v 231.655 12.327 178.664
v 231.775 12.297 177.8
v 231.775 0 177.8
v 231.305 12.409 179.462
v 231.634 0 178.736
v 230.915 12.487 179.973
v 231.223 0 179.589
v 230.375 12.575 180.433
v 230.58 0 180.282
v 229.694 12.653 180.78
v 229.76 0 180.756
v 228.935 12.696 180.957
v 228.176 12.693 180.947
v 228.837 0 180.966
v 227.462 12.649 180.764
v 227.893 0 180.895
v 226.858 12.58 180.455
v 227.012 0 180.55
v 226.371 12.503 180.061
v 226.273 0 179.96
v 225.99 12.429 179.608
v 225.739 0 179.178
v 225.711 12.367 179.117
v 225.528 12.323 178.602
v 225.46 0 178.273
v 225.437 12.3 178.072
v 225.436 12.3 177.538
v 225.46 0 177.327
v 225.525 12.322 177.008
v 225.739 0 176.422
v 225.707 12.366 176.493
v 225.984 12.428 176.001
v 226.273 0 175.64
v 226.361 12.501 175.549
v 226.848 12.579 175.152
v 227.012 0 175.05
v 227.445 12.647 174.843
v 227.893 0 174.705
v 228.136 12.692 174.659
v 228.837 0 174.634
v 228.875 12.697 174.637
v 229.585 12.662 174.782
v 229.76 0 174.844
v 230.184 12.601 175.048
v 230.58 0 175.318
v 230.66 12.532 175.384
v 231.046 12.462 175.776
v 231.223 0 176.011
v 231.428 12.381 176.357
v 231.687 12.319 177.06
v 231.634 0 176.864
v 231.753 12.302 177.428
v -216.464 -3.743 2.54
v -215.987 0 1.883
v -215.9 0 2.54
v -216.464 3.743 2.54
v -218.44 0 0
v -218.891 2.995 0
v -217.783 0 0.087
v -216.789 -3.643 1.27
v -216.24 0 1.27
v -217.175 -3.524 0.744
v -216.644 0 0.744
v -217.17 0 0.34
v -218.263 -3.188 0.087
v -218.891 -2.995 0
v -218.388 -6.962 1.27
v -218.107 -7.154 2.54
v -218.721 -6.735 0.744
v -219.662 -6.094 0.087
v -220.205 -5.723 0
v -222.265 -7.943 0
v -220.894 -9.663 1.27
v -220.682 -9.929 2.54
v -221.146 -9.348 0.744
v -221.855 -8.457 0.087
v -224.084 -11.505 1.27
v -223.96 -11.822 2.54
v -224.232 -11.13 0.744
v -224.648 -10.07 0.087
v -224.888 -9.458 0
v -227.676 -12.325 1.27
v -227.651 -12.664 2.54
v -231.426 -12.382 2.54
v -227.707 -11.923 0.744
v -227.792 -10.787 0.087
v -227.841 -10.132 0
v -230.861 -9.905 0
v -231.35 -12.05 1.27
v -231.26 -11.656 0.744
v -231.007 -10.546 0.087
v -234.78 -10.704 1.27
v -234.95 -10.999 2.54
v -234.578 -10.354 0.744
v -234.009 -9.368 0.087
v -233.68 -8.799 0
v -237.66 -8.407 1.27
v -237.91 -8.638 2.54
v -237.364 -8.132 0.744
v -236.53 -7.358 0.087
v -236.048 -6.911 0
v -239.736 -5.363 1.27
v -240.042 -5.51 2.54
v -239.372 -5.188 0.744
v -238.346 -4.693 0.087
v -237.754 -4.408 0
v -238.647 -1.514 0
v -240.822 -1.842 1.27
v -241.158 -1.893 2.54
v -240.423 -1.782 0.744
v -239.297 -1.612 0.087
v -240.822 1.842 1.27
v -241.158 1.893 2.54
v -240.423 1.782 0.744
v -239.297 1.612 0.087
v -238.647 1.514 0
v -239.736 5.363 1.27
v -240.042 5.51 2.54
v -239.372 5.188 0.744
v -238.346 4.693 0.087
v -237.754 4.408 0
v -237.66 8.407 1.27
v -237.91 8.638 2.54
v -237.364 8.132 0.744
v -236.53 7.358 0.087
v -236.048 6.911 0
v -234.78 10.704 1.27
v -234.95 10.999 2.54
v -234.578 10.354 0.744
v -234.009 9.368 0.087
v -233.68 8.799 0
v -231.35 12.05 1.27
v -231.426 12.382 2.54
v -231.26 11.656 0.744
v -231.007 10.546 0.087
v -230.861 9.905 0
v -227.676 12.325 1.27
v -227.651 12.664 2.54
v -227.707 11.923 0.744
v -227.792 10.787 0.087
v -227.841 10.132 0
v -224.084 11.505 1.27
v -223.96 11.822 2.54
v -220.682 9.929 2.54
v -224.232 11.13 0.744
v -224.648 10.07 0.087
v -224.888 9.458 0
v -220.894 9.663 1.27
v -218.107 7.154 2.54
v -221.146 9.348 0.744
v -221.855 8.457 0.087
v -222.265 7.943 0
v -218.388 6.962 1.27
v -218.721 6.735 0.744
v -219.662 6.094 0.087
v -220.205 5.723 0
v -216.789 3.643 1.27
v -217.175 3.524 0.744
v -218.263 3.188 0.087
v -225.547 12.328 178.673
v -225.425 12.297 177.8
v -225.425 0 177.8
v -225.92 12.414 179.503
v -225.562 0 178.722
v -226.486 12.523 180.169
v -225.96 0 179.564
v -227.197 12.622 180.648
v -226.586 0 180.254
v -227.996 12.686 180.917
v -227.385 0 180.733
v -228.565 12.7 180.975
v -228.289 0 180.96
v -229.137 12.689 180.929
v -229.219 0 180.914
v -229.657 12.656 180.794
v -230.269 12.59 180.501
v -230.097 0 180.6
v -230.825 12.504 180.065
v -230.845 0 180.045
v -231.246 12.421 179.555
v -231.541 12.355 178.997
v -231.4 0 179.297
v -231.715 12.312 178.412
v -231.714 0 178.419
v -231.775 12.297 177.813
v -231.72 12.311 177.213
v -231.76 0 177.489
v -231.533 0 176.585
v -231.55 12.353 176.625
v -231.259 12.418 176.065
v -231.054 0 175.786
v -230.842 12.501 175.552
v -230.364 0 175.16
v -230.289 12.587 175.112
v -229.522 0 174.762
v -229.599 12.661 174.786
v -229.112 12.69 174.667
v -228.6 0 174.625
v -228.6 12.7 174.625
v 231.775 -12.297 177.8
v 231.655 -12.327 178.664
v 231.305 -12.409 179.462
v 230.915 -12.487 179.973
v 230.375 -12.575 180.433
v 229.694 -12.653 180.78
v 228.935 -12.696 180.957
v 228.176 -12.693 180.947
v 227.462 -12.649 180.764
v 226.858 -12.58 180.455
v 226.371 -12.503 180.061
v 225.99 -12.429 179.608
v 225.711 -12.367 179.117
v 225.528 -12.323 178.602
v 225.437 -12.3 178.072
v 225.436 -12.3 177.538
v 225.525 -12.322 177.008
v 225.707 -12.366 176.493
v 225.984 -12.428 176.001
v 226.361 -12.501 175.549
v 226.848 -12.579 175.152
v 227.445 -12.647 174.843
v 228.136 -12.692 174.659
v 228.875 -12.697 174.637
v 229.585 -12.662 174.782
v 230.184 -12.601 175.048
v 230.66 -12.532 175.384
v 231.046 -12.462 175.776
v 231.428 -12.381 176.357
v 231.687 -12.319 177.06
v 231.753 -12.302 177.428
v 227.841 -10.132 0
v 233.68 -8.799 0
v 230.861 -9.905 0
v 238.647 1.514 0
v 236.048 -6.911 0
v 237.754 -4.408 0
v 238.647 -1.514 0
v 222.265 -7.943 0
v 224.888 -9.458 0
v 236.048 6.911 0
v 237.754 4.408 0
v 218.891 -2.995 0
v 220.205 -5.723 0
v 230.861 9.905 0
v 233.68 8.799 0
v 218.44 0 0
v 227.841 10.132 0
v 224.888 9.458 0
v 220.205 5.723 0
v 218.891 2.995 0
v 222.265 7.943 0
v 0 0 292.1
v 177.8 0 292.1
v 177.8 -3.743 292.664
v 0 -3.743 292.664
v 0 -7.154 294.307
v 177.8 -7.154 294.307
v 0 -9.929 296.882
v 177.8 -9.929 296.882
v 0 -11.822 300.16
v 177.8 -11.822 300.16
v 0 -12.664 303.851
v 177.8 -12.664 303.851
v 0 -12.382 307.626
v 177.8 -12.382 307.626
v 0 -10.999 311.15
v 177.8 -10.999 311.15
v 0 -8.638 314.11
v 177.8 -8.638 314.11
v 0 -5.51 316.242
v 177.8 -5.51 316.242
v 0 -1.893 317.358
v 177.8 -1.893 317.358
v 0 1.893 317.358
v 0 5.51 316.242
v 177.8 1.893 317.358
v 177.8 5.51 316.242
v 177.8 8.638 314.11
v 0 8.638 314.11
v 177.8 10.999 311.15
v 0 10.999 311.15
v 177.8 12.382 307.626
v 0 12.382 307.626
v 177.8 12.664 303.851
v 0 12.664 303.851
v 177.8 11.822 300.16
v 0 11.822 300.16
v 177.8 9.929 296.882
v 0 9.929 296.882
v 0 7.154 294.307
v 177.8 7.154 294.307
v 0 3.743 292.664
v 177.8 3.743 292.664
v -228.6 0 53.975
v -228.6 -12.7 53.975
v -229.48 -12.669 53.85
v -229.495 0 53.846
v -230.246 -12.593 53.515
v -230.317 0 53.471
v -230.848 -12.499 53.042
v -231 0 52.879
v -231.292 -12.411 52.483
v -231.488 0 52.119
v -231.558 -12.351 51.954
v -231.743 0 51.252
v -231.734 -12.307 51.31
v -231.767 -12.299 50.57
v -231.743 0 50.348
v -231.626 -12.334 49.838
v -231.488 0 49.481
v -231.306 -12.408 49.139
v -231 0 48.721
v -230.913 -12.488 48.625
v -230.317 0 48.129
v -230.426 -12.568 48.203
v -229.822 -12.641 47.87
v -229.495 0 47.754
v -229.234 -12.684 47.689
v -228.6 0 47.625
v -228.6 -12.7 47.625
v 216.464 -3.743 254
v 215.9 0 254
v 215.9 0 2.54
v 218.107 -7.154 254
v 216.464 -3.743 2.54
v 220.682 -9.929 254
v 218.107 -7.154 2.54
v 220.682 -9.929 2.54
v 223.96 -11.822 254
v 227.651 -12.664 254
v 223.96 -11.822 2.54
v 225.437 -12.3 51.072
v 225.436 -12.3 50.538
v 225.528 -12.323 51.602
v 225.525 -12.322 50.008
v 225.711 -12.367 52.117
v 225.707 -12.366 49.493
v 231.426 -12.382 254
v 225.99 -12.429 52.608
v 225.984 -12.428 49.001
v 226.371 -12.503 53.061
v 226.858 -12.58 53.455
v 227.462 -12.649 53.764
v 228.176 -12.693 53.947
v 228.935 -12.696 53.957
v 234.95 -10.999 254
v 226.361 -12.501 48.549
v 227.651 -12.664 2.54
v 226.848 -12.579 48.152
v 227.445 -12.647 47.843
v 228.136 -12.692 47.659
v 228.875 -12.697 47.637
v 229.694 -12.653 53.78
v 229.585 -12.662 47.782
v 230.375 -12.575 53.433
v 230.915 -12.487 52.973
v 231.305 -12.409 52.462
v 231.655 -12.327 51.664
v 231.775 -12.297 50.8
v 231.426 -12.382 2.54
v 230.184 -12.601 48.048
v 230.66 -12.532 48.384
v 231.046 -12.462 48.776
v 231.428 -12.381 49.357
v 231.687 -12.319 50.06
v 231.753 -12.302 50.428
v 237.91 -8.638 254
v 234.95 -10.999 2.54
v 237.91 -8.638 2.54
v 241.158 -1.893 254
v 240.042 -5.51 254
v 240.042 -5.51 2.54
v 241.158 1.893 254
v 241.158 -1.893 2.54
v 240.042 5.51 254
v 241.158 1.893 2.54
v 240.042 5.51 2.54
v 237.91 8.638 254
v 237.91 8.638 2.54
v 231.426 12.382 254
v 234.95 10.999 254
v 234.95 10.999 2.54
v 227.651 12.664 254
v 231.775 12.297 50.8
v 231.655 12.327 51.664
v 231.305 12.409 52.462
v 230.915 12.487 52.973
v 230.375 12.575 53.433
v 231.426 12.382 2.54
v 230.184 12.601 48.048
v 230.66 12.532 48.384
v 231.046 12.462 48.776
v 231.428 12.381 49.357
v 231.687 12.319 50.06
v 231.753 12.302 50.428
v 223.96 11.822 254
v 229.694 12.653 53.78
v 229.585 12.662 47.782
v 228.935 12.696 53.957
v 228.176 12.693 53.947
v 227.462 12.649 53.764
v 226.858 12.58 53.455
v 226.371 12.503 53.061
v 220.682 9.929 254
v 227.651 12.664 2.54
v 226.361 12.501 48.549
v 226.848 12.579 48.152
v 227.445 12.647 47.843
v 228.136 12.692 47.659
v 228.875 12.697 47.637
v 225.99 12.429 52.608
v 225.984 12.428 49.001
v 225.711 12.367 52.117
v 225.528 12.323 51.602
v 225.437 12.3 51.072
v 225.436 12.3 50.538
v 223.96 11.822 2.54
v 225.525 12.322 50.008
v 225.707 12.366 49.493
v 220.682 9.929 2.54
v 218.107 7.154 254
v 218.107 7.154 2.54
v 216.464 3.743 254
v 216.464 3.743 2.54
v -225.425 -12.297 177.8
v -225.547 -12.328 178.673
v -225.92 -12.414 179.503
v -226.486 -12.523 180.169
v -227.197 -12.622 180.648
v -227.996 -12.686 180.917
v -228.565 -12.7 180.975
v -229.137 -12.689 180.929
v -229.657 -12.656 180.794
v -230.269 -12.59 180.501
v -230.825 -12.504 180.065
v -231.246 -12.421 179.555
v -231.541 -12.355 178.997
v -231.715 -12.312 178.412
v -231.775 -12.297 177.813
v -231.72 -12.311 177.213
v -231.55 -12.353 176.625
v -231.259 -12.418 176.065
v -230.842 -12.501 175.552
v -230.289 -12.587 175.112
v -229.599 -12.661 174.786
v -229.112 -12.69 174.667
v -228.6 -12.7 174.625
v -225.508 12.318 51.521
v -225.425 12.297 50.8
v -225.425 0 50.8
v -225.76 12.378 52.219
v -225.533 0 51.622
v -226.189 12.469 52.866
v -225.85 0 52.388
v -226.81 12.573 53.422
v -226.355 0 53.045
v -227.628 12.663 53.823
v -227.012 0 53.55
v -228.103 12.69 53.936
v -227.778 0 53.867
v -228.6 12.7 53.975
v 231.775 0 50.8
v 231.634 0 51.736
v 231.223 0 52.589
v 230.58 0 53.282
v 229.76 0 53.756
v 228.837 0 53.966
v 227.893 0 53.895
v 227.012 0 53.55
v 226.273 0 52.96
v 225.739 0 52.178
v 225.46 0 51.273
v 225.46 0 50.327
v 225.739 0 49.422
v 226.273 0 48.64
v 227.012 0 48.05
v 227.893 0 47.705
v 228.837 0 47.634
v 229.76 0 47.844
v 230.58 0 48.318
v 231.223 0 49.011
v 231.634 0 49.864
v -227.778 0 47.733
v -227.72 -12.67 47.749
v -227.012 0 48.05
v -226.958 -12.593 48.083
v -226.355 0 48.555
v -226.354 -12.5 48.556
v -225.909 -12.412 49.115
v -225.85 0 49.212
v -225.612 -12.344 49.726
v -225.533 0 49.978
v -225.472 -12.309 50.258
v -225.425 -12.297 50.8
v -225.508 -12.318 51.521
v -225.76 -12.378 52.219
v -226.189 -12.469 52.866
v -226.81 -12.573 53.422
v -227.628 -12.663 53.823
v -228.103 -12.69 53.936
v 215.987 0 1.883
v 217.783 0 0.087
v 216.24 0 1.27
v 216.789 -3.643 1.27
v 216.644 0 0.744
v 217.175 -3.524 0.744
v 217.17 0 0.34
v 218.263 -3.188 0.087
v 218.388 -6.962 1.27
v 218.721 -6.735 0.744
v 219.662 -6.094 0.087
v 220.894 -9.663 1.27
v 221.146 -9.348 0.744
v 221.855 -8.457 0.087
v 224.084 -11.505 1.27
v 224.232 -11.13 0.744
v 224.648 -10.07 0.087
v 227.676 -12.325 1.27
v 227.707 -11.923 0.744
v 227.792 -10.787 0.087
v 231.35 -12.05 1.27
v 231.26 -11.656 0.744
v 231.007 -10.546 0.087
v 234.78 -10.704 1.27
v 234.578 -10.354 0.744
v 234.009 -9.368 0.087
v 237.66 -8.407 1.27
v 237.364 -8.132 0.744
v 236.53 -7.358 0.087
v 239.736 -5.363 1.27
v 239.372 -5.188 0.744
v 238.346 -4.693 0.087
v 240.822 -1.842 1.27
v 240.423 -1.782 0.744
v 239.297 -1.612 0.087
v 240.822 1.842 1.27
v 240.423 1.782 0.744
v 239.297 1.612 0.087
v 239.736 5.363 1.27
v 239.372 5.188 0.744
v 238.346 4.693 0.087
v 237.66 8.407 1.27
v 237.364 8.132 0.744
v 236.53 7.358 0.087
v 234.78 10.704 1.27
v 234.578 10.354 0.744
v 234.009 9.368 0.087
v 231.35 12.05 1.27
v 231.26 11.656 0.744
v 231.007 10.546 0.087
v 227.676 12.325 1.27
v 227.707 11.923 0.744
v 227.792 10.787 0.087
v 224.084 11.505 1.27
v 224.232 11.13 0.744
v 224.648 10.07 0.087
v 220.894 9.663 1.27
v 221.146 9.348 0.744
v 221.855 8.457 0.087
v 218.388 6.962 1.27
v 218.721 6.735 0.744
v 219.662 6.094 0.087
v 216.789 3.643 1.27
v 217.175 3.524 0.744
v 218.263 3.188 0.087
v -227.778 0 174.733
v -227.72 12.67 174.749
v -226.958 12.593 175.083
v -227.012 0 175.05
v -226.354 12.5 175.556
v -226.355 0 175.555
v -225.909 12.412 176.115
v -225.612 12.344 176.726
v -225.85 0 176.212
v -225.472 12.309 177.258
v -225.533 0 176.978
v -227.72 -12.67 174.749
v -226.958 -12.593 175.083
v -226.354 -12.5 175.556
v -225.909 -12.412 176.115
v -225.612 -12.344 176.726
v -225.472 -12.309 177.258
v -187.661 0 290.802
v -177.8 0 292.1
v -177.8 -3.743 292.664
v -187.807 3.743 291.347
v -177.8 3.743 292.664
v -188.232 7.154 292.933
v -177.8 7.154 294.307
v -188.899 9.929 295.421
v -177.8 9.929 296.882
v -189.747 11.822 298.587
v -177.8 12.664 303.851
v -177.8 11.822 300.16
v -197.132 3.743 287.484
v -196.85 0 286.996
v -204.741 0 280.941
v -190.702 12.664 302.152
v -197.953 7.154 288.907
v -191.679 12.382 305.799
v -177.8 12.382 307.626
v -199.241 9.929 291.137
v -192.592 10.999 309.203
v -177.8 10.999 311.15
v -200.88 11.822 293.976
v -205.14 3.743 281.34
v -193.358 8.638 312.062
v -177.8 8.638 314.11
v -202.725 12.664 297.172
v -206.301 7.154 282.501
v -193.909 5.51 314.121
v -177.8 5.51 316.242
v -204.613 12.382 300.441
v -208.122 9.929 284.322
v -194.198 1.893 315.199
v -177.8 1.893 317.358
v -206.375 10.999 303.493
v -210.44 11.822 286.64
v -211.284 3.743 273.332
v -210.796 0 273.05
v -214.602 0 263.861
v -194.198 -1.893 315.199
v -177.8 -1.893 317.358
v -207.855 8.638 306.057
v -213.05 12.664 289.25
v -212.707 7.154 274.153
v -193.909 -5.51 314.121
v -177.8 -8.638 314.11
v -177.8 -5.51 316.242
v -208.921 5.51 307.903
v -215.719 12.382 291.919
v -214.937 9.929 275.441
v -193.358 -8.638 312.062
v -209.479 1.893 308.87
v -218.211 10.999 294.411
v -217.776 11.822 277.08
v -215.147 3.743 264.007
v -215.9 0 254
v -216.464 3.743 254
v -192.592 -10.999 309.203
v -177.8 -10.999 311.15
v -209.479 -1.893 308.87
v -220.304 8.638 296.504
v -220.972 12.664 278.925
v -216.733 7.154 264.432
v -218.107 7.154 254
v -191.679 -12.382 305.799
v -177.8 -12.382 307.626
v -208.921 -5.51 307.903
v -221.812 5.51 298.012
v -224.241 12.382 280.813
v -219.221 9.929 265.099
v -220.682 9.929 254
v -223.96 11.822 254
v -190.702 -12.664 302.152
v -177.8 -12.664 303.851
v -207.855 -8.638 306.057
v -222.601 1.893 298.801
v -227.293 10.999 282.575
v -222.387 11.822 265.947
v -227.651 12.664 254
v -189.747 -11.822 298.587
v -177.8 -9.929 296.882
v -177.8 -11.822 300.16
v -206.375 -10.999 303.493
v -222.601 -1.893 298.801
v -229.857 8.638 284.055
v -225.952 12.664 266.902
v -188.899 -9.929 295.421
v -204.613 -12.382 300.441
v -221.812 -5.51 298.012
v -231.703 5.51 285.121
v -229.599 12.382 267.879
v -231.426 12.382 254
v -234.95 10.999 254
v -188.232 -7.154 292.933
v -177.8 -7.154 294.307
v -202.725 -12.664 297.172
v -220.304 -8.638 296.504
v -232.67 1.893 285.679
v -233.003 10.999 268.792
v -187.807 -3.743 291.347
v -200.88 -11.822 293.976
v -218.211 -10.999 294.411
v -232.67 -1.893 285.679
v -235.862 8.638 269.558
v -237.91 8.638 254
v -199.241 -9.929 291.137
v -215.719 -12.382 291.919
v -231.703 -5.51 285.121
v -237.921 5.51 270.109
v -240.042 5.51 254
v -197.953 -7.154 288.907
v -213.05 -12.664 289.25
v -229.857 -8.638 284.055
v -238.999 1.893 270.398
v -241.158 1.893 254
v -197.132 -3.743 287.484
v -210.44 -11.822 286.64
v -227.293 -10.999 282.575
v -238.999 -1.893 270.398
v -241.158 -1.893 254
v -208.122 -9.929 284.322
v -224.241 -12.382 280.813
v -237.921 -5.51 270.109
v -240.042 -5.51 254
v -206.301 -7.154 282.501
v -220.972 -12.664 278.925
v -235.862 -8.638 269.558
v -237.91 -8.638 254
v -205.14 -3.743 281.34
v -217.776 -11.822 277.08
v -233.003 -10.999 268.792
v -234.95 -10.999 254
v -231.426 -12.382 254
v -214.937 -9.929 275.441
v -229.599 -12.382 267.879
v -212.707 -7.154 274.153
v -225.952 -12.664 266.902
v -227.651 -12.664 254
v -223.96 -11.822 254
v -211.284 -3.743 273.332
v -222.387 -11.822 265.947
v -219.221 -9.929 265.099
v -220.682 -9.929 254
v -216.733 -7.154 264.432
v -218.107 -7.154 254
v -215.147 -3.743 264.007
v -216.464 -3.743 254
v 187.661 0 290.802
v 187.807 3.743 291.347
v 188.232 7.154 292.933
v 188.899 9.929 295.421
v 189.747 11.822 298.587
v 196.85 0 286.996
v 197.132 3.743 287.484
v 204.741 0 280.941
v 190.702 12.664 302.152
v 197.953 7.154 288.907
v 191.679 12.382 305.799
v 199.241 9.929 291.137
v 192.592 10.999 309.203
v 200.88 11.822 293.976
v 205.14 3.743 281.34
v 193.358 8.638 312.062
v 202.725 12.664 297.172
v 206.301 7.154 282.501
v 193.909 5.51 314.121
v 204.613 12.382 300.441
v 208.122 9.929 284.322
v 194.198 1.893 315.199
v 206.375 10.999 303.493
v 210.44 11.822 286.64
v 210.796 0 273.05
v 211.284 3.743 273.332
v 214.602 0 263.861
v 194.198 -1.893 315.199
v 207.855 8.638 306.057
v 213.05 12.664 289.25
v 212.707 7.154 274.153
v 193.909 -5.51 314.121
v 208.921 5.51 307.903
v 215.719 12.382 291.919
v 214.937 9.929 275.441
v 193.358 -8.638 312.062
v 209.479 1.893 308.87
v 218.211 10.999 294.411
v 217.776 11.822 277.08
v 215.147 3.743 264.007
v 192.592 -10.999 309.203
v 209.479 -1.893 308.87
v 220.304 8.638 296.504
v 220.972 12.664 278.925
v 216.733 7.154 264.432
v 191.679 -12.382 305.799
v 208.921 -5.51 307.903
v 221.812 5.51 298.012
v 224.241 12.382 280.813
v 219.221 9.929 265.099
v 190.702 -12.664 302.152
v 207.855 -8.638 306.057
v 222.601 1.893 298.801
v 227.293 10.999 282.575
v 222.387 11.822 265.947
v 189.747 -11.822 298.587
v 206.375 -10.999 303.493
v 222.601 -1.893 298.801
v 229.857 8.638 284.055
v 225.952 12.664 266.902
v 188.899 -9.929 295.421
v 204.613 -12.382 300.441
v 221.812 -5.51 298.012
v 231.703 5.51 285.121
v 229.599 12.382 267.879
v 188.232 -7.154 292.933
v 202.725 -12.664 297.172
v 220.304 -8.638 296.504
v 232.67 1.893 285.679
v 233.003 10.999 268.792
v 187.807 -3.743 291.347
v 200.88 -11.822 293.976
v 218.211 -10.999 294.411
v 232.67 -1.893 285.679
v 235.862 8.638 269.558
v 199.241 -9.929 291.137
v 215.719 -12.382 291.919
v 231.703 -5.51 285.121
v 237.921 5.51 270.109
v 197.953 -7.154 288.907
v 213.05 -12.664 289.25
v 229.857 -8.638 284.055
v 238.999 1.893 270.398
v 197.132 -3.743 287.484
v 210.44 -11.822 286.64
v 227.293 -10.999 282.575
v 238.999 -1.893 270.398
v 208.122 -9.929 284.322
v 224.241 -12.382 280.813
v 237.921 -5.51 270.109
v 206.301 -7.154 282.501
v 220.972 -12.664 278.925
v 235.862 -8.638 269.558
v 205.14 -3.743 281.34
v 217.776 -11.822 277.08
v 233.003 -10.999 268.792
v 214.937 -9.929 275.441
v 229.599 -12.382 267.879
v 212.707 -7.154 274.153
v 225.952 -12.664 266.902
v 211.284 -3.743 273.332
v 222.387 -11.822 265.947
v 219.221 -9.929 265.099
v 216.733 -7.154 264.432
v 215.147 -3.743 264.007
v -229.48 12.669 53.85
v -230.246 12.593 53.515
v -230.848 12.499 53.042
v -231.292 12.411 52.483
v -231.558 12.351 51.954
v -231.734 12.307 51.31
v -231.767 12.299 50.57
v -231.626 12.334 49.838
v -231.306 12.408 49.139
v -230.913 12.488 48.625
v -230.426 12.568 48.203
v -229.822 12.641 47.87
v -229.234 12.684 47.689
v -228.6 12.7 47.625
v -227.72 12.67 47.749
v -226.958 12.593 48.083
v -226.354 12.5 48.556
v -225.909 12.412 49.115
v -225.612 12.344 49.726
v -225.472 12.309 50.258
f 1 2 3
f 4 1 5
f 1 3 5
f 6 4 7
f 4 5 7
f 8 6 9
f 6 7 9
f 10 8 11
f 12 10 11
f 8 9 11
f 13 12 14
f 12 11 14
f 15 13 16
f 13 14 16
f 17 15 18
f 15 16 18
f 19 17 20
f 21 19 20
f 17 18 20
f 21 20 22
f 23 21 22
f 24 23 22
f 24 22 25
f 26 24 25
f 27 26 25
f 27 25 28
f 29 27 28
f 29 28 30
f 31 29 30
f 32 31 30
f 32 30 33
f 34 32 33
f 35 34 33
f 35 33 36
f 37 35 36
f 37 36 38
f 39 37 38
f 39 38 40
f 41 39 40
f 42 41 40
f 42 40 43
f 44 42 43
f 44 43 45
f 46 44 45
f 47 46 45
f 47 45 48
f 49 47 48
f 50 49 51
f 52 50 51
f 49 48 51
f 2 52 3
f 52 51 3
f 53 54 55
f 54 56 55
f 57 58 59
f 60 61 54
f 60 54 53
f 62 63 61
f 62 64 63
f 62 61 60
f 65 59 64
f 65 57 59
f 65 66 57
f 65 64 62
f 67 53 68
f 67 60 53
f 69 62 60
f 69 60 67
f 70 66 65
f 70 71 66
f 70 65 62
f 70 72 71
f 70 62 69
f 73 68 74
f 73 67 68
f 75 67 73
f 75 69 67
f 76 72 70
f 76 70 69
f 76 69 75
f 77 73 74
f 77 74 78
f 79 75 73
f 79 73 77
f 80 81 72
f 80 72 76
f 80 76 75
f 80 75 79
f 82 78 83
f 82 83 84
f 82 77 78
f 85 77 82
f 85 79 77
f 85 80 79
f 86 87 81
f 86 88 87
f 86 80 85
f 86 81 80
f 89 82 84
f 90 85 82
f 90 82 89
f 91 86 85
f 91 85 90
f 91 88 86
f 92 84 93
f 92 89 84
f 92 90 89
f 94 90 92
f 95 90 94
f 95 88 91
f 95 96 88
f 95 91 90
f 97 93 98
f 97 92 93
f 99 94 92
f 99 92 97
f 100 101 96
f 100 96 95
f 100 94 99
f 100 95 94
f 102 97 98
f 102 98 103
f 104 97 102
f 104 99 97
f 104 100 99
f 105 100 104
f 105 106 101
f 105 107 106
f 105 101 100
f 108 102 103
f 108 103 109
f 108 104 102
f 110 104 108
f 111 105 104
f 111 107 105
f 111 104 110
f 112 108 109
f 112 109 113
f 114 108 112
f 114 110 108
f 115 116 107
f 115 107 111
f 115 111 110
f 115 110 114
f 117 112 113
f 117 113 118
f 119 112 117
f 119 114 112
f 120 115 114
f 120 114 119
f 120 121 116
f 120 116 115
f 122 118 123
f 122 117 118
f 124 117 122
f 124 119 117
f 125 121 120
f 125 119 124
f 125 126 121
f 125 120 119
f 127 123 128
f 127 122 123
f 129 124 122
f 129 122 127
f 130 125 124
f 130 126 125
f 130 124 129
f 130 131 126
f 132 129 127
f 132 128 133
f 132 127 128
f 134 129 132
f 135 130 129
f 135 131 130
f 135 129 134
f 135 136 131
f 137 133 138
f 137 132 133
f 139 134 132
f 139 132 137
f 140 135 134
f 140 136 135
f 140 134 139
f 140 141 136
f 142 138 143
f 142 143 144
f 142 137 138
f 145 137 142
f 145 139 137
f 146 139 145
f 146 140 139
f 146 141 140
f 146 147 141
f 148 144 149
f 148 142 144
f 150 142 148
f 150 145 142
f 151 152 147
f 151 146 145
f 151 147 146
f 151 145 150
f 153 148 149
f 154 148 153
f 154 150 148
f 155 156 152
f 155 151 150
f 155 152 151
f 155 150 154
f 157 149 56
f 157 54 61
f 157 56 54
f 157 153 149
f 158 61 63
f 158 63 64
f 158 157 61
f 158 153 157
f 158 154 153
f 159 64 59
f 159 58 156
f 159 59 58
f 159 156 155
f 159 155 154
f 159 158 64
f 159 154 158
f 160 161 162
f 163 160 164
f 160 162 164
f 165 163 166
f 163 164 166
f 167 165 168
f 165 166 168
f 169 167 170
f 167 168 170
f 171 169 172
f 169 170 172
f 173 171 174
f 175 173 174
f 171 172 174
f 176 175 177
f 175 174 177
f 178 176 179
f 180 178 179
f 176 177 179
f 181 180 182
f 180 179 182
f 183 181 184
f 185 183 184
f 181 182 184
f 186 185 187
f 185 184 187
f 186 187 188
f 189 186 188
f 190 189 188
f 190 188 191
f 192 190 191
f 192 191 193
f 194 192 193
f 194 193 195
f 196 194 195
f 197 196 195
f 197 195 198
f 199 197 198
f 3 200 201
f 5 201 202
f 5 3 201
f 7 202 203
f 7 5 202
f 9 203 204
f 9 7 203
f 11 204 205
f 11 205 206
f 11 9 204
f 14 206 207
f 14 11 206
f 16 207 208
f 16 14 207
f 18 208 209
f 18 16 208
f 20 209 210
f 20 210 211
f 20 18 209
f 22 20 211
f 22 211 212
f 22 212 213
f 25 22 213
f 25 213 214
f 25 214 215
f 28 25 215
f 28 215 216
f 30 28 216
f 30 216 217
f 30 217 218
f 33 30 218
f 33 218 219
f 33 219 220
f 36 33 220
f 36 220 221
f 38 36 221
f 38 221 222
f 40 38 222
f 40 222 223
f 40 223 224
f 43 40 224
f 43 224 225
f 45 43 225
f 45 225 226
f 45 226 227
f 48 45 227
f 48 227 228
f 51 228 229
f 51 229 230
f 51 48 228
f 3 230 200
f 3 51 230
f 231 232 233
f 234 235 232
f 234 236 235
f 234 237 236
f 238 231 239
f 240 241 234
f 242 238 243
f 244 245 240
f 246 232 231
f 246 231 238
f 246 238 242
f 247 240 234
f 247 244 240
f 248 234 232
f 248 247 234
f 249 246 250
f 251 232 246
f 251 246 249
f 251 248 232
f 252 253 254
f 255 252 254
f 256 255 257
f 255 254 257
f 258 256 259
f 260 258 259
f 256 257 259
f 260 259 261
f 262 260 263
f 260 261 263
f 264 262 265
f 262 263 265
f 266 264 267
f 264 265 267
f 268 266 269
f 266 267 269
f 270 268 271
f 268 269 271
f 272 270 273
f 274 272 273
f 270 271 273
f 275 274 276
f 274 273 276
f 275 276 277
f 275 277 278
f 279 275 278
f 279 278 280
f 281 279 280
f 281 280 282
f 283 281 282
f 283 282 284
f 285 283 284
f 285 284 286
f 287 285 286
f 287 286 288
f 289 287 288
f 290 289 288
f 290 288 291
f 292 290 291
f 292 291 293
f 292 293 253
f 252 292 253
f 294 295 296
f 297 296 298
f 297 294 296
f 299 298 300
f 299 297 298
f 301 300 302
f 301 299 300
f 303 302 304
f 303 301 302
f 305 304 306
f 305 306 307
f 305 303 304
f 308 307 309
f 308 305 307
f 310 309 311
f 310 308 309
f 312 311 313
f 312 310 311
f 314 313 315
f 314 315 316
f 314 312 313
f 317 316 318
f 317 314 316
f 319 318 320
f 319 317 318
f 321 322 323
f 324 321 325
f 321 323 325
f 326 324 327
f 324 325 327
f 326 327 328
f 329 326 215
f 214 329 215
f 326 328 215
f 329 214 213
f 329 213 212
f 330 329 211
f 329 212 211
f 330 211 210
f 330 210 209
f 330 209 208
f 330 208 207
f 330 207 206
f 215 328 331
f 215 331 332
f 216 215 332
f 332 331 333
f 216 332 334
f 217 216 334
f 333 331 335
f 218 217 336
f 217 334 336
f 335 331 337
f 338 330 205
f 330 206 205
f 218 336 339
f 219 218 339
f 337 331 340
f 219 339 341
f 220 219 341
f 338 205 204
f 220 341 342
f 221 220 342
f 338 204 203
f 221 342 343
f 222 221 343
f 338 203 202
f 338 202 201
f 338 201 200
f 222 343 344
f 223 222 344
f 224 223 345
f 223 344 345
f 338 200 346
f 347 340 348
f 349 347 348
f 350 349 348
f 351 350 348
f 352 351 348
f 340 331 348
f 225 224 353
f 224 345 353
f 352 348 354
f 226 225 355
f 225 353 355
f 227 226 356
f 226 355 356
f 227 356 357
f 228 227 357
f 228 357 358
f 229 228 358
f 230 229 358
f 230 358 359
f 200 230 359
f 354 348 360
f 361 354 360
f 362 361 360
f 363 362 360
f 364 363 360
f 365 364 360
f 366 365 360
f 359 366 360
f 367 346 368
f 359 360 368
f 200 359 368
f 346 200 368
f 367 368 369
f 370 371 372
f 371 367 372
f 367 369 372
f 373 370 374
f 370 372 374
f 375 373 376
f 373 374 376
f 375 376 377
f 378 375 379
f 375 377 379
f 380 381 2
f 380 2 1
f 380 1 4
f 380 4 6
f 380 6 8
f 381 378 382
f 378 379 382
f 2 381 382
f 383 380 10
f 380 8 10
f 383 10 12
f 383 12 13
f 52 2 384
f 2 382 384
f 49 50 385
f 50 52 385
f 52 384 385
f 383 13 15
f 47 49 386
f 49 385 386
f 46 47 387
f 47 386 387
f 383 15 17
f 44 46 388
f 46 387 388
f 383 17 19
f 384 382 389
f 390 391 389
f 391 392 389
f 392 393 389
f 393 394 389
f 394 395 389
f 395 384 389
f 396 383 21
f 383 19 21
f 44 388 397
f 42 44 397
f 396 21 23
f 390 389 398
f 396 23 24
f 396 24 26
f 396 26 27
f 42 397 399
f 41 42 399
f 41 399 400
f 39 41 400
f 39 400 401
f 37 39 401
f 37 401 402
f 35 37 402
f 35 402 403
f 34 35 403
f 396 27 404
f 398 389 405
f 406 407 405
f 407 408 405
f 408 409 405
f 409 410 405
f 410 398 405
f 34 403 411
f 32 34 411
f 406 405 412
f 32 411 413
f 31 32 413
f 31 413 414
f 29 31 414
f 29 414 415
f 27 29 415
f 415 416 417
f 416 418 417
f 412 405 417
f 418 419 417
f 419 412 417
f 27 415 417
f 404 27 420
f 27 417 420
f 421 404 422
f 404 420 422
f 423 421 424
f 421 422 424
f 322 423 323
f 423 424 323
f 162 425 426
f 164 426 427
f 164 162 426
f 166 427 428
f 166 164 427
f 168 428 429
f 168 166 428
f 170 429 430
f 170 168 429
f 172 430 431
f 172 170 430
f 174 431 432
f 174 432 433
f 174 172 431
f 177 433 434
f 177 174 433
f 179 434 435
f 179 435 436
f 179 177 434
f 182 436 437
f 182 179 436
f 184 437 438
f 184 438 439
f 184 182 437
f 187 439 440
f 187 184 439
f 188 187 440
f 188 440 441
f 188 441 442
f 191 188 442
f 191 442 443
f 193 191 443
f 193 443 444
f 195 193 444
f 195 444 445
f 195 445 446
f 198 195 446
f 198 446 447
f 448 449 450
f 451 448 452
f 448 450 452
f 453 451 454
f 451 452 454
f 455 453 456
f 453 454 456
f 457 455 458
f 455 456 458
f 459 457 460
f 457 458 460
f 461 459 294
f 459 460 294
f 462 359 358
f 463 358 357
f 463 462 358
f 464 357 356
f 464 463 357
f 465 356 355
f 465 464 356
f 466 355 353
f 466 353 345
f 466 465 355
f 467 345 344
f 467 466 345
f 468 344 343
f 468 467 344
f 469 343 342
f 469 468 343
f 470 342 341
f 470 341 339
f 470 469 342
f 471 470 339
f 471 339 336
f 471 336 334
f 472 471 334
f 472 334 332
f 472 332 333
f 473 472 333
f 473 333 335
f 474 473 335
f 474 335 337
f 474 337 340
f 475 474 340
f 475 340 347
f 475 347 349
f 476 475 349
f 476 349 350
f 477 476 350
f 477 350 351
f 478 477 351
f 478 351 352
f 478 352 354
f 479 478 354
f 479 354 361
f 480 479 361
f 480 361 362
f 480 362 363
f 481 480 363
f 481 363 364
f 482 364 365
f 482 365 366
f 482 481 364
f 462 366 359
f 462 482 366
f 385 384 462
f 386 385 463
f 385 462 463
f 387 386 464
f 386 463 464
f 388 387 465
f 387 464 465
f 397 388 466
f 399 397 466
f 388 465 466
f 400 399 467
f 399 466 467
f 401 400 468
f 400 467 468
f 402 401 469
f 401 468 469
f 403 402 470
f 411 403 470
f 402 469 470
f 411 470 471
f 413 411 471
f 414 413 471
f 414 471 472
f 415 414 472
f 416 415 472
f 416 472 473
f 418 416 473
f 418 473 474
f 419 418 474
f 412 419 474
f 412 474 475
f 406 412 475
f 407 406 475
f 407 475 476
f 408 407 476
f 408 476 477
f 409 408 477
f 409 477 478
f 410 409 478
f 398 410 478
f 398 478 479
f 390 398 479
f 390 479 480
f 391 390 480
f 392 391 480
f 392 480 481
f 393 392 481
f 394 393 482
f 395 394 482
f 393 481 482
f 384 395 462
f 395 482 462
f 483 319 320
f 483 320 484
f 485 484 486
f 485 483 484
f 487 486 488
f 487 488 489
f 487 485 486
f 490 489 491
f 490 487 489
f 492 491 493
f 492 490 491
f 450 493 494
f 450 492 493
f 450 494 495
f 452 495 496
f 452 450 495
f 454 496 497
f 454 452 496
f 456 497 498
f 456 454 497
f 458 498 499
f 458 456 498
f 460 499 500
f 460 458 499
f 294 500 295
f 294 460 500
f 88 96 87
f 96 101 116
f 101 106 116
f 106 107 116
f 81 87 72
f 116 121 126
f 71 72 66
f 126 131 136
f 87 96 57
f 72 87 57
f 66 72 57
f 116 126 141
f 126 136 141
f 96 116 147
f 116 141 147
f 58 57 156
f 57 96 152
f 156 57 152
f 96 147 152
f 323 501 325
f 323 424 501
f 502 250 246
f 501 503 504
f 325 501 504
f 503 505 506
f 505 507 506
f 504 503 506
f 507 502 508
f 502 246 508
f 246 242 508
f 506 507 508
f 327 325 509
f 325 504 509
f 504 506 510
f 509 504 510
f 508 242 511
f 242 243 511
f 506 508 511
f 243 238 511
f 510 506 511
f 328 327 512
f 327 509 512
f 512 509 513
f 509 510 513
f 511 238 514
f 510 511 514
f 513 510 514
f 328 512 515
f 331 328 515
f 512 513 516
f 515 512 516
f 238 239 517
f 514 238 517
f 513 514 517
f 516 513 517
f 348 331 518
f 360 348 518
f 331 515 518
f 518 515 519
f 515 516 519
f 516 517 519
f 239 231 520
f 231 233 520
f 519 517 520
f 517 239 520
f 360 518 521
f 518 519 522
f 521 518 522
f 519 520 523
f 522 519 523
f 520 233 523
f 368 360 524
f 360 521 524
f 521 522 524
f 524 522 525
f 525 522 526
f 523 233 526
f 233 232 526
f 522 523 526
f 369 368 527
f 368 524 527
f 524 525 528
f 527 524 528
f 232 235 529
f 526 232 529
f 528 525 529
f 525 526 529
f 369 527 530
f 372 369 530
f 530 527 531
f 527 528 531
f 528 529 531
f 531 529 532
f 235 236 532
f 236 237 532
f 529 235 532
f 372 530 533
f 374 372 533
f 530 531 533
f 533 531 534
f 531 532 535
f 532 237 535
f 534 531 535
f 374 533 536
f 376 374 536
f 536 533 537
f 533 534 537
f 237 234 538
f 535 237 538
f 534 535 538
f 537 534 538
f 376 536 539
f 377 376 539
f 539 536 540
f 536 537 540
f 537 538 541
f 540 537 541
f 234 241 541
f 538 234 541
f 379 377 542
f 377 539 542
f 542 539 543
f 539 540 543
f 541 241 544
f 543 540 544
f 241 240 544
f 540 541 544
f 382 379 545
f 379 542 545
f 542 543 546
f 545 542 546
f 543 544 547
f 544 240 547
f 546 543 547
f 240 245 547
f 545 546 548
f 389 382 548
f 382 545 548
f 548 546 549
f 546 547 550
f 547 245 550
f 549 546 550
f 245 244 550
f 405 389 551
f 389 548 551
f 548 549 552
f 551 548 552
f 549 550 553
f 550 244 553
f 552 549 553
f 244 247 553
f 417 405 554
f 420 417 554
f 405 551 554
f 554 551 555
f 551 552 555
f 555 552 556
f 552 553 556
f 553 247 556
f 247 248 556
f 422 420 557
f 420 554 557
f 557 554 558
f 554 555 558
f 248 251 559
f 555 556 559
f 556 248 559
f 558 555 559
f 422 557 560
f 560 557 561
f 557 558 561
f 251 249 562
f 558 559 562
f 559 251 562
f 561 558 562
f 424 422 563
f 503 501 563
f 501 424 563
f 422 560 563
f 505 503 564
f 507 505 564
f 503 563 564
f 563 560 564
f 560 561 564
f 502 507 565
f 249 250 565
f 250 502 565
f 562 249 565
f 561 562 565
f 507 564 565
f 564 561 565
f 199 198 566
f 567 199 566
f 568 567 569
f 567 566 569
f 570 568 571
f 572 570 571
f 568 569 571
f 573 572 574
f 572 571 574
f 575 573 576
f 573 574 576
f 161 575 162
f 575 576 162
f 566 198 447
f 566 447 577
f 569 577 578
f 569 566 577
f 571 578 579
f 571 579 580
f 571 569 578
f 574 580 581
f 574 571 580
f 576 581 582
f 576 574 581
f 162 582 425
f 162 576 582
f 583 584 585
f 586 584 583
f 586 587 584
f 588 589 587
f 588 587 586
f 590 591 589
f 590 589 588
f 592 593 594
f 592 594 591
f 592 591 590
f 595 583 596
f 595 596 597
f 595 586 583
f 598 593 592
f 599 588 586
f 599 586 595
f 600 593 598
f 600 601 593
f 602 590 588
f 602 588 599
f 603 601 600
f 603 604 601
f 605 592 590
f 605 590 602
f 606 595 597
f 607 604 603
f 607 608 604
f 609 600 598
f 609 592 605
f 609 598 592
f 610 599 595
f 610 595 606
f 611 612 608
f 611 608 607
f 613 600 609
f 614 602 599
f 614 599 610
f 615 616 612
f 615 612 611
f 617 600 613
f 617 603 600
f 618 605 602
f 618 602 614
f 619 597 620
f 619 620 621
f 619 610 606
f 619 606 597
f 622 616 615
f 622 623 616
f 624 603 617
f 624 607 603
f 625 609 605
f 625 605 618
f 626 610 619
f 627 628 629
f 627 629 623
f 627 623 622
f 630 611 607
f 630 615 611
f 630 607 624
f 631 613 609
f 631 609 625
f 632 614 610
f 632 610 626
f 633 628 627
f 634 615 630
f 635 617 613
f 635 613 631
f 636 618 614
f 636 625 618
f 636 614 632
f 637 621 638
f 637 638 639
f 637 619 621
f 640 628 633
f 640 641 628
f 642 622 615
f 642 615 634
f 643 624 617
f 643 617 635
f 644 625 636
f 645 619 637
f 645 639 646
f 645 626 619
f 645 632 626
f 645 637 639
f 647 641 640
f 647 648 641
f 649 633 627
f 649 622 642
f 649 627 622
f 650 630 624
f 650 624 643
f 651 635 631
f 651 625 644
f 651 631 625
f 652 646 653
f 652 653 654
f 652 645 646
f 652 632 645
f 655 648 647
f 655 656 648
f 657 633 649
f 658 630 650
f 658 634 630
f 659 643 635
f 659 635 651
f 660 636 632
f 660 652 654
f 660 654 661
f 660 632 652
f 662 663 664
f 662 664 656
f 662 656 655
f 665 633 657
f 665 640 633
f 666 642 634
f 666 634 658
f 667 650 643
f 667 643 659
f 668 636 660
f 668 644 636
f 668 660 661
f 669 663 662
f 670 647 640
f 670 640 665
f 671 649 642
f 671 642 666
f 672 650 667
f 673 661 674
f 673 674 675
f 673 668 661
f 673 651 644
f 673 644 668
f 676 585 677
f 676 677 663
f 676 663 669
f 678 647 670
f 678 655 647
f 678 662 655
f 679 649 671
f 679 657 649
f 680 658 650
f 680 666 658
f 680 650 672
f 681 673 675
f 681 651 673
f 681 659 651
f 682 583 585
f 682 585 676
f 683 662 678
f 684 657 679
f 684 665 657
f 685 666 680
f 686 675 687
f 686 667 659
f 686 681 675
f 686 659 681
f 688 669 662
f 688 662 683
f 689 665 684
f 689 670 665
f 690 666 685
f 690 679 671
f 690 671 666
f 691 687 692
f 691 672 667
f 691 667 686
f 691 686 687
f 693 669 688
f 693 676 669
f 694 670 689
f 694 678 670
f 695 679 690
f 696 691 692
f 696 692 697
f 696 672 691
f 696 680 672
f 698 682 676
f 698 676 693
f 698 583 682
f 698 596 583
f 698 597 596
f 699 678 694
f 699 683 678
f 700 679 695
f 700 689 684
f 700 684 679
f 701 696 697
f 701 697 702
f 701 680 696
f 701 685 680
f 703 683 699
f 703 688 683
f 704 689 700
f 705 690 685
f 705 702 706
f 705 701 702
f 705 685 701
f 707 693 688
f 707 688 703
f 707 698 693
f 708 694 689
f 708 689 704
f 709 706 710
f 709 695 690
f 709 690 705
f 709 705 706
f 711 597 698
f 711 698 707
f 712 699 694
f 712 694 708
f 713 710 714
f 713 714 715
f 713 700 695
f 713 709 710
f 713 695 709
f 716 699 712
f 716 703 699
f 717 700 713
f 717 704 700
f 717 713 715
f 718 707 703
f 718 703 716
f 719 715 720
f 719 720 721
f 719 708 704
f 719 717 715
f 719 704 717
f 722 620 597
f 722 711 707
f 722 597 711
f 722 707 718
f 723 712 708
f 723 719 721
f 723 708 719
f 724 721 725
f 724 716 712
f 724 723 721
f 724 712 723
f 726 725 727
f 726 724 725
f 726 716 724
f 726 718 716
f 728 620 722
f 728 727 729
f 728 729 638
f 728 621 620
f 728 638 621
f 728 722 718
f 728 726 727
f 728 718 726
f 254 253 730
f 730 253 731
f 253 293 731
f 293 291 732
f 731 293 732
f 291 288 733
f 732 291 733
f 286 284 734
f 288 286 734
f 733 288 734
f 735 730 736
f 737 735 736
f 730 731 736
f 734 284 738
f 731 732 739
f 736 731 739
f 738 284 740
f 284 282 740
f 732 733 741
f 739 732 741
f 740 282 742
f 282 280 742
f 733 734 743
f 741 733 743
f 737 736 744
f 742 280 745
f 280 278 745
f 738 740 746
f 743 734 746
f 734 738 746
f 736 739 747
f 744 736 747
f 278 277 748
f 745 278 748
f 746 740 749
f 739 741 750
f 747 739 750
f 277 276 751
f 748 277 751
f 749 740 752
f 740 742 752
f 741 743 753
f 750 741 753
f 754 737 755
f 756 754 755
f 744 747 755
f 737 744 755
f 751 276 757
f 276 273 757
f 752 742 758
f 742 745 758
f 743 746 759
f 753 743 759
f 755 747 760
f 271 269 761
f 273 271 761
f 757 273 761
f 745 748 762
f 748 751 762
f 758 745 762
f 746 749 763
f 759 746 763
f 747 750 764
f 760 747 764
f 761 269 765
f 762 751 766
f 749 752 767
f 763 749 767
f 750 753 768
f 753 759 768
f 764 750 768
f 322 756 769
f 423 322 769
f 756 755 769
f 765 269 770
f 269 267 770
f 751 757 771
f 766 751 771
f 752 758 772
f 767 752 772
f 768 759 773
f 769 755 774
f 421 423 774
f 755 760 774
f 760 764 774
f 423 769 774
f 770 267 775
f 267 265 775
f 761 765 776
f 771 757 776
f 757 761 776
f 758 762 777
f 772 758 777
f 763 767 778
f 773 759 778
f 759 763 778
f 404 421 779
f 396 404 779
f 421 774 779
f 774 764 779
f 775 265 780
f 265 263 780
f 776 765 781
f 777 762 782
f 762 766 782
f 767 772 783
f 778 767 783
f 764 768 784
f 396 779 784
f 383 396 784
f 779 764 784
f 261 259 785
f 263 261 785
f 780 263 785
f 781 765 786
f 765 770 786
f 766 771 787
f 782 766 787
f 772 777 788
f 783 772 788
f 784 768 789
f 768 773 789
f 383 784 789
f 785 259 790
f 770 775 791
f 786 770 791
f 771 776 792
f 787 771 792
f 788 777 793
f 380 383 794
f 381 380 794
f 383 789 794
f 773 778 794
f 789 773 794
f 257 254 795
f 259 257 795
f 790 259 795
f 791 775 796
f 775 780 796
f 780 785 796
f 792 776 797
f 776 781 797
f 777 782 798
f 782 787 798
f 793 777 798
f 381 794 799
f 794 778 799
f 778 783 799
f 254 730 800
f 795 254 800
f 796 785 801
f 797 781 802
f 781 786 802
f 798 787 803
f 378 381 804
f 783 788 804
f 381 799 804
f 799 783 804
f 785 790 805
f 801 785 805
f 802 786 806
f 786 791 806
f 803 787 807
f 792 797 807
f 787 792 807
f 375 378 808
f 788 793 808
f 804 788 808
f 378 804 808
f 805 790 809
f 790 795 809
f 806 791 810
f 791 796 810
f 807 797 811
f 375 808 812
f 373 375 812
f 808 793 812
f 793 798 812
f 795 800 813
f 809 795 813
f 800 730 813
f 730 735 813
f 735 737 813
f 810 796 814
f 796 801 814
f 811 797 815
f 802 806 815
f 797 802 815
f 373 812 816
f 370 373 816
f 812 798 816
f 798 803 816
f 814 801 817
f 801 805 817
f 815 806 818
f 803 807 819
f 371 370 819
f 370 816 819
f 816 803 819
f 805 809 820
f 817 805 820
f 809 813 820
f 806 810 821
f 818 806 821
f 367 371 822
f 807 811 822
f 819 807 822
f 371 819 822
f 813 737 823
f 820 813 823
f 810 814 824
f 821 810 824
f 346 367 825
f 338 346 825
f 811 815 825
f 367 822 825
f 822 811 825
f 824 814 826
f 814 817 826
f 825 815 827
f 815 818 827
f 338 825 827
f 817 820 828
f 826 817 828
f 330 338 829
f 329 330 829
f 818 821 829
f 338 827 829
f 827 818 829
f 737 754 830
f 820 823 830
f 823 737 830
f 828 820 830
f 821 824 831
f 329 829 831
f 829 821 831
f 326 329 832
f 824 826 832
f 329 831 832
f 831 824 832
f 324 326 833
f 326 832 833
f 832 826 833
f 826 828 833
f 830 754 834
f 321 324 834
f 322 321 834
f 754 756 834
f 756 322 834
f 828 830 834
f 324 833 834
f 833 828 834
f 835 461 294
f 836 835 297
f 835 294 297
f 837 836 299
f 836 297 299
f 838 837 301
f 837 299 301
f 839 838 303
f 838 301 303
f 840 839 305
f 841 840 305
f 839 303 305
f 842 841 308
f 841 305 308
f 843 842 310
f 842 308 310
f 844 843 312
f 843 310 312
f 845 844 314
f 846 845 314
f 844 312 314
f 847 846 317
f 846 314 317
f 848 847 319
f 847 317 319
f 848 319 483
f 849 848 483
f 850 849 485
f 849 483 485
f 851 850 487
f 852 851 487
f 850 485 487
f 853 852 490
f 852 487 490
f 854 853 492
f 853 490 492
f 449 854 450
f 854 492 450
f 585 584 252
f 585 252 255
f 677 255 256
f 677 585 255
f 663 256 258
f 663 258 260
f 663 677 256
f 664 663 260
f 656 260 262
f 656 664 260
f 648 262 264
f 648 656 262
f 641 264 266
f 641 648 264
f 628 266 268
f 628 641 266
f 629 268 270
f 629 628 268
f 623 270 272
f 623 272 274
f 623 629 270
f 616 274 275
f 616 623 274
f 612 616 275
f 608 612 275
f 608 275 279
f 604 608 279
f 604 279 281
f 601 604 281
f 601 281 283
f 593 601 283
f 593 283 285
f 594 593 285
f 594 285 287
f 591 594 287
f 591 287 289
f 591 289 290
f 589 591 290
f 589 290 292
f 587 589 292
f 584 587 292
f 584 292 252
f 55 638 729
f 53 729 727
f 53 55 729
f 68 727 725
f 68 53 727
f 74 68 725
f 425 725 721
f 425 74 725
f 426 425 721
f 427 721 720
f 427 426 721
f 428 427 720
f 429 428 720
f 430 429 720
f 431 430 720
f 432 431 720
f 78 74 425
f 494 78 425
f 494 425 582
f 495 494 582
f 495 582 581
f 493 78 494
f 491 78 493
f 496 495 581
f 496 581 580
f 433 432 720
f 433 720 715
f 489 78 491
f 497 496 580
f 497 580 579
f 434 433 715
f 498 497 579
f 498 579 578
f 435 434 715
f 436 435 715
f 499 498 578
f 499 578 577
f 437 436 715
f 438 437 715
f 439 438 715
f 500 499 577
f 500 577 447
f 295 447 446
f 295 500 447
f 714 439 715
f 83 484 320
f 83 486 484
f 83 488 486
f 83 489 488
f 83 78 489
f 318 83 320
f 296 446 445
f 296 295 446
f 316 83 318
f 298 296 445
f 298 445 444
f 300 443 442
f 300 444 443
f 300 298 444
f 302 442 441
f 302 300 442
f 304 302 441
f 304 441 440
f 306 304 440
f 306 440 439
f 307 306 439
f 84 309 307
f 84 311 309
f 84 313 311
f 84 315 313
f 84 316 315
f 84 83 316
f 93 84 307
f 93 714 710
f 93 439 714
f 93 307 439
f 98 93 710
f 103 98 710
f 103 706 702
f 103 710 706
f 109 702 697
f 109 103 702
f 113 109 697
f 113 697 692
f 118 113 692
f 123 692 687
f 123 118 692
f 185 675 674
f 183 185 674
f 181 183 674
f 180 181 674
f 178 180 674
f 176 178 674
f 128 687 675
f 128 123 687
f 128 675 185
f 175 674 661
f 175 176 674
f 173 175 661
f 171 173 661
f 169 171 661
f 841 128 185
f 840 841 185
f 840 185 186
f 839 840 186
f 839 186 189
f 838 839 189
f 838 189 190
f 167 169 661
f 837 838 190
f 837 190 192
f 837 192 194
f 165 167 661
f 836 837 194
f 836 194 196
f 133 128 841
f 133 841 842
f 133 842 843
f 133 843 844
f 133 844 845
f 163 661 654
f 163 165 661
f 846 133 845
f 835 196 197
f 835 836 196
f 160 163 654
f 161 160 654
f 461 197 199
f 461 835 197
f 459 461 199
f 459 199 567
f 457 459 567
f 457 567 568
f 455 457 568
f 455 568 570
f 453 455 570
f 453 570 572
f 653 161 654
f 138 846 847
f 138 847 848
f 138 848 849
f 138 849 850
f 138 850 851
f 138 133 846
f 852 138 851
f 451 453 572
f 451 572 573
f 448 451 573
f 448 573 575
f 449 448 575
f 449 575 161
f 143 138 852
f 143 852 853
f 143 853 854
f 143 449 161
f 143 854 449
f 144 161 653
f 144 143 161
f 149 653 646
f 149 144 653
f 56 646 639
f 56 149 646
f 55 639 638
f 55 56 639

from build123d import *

# Parameters (mm, degrees)
F0_R          = 12.7
F4_R          = 3.175
F5_DEPTH      = 25.4
F5_DEPTH_BACK = 25.4
F6_R          = 2.54


with BuildPart() as f2:
    # F2: sweep along a path in F1
    with BuildLine(Plane.XZ) as f2_path:
        Line((0, 304.8), (-177.8, 304.8))
        ThreePointArc((-177.8, 304.8), (-213.7210244843, 289.9210244843), (-228.6, 254))
        Line((-228.6, 254), (-228.6, 0))
    # F0 (on Top) → F2 (sweep)
    with BuildSketch(Plane.XY):
        with Locations((-228.6, 0)):
            Circle(F0_R)
    sweep(path=f2_path.line)

    # F3: F2 across plane


with BuildPart() as f2_1:
    add(f2.part)
    add(f2.part.mirror(Plane.YZ))

    # F4 (on Front) → F5 (cut, two sides)
    with BuildSketch(Plane.XZ) as f5_sk:
        with BuildLine():
            ThreePointArc((-228.6, 53.975), (-231.775, 50.8), (-228.6, 47.625))
            Line((-228.6, 47.625), (-228.6, 50.8))
            Line((-228.6, 50.8), (-228.6, 53.975))
        make_face()
        with BuildLine():
            ThreePointArc((-225.425, 177.8), (-230.8450640303, 180.0450640303), (-228.6, 174.625))
            ThreePointArc((-228.6, 174.625), (-226.3549359697, 175.5549359697), (-225.425, 177.8))
        make_face()
        with BuildLine():
            Line((-228.6, 50.8), (-228.6, 47.625))
            ThreePointArc((-228.6, 47.625), (-226.3549359697, 48.5549359697), (-225.425, 50.8))
            ThreePointArc((-225.425, 50.8), (-226.3549359697, 53.0450640303), (-228.6, 53.975))
            Line((-228.6, 53.975), (-228.6, 50.8))
        make_face()
        with Locations((228.6, 177.8)):
            Circle(F4_R)
        with Locations((228.6, 50.8)):
            Circle(F4_R)
    extrude(amount=F5_DEPTH, mode=Mode.SUBTRACT)
    extrude(f5_sk.sketch, amount=-F5_DEPTH_BACK, mode=Mode.SUBTRACT)

    # F6
    f6_edges = [f2_1.edges().sort_by_distance(p)[0] for p in [
        (241.3, 0, 0),
        (-241.3, 0, 0),
    ]]
    fillet(f6_edges, radius=F6_R)


solid = f2_1.part
